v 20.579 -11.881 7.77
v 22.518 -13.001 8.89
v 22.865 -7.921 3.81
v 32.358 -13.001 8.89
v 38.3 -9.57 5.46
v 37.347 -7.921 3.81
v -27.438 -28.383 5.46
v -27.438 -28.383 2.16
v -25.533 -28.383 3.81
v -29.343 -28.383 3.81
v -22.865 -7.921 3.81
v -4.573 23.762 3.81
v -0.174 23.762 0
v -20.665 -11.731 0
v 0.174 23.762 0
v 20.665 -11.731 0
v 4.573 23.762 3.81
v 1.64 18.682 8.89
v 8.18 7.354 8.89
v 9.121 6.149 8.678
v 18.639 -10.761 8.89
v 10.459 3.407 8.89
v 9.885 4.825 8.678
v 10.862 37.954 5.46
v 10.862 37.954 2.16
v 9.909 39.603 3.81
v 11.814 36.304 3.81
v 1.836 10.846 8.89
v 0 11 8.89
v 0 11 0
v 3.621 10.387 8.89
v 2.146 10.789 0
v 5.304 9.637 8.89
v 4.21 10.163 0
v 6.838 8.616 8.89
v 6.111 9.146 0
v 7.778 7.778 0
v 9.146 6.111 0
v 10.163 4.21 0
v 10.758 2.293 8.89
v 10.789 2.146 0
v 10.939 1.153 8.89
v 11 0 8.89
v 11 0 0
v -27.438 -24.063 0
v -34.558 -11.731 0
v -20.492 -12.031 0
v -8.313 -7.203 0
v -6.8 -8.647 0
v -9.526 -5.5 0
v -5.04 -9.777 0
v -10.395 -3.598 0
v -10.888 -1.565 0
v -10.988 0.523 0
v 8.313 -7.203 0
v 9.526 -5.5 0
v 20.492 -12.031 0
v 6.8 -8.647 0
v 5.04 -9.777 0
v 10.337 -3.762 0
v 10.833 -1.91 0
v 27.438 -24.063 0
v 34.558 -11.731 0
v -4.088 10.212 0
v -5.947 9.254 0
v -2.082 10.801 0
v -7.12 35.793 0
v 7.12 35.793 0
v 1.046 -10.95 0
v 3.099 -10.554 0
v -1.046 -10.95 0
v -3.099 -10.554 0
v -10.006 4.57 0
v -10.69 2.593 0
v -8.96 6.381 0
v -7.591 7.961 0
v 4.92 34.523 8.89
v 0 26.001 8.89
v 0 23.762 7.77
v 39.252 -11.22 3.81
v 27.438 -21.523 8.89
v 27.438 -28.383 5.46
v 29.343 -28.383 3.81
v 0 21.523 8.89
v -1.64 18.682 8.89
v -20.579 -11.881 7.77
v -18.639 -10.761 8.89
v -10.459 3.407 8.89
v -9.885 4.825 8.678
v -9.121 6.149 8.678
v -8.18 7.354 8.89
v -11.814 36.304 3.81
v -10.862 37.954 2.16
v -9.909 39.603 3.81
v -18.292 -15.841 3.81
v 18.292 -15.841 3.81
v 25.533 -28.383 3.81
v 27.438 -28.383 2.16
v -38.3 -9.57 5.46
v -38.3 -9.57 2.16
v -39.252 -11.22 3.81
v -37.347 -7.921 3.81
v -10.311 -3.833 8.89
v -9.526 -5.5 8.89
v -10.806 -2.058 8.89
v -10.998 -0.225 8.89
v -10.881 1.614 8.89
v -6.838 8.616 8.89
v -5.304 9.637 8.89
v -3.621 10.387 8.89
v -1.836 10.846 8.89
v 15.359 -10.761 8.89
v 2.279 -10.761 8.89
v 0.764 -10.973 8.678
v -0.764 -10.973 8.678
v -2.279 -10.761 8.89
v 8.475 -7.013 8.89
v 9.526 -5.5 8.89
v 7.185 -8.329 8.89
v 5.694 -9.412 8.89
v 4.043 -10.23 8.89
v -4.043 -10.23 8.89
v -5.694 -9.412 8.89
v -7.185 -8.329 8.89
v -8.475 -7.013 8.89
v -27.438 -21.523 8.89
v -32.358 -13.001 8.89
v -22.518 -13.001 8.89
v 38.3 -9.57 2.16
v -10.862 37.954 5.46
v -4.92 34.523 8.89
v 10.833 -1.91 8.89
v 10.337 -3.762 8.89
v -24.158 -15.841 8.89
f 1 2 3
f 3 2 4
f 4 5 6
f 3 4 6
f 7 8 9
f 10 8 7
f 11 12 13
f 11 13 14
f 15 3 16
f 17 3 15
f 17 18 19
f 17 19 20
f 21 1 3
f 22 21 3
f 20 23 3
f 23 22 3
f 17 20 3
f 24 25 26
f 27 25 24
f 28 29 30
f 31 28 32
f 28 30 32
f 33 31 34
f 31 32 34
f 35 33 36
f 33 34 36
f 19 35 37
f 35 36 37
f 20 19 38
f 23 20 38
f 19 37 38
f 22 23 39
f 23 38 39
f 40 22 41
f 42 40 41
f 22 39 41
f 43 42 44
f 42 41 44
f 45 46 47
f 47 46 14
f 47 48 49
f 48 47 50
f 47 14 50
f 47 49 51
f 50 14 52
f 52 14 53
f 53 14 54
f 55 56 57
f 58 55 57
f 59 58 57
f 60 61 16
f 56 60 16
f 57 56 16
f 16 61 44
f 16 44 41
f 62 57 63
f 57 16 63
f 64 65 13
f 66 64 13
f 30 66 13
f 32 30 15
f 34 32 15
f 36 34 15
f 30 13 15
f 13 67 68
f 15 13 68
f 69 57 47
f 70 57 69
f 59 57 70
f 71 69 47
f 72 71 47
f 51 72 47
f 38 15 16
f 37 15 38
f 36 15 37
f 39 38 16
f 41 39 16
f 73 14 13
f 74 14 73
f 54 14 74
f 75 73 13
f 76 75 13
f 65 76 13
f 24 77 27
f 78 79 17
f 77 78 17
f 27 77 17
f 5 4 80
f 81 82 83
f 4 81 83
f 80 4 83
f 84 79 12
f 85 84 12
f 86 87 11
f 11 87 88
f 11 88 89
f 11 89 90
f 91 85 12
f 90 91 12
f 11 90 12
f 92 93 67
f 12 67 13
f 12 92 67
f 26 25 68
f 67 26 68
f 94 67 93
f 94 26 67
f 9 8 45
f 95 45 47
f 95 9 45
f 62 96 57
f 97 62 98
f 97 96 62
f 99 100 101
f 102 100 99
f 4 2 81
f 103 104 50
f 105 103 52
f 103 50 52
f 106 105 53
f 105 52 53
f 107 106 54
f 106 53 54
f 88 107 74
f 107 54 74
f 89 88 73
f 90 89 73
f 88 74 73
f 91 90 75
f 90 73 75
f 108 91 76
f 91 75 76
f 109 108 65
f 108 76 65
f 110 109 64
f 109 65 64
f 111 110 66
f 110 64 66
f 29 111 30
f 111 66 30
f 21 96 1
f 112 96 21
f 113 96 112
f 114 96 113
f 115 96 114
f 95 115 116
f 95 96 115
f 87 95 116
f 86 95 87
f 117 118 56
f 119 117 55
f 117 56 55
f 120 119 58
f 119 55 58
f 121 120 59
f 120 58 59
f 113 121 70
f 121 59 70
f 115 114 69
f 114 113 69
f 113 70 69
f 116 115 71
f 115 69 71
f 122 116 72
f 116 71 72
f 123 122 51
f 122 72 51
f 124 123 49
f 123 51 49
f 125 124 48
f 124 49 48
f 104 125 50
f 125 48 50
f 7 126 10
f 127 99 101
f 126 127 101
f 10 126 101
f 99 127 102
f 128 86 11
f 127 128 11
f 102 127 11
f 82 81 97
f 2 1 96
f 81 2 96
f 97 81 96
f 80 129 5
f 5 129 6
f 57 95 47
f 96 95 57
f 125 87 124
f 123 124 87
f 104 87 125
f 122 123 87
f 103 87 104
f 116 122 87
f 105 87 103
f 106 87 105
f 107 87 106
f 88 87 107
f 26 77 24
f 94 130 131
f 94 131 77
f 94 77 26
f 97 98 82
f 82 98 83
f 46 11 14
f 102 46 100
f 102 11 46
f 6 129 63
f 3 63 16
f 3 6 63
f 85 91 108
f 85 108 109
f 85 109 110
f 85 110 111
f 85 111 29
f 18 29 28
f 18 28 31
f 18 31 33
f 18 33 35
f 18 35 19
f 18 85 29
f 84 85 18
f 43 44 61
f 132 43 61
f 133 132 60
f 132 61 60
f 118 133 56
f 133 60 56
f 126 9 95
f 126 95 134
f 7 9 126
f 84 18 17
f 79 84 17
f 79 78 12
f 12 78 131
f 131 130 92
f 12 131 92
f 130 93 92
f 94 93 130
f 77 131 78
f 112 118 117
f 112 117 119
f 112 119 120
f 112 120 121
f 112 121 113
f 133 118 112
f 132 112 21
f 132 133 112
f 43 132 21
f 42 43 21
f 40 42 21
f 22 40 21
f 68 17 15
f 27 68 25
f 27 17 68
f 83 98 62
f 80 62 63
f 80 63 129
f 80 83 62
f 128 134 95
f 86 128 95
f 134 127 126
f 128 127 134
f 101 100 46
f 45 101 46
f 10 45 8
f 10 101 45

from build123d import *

# Parameters (mm, degrees)
F1_DEPTH      = 8.89
F2_DEPTH      = 8.89
F3_SIZE       = 3.81
F4_SIZE       = 3.81
F5_T1_DEPTH   = 45.9464028027
F5_T3_DEPTH   = 45.9464028027
F5_T5_DEPTH   = 45.9464028027
F5_T10_DEPTH  = 40.6103682544
F5_T15_DEPTH  = 40.6103682544
F5_T20_DEPTH  = 62.7124373511
F5_T26_DEPTH  = 62.7124373511
F5_T32_DEPTH  = 40.6103682544
F5_T37_DEPTH  = 40.6103682544
F5_T42_DEPTH  = 62.7124373511
F5_T48_DEPTH  = 40.6103682544
F5_T53_DEPTH  = 40.6103682544
F5_T58_DEPTH  = 29.9382991577
F5_T63_DEPTH  = 29.9382991577
F5_T68_DEPTH  = 29.9382991577
F5_T73_DEPTH  = 29.9382991577
F5_T78_DEPTH  = 29.9382991577
F5_T83_DEPTH  = 29.9382991577
F5_T88_DEPTH  = 29.9382991577
F5_T93_DEPTH  = 29.9382991577
F5_T98_DEPTH  = 29.9382991577
F5_T103_DEPTH = 29.9382991577
F5_T108_DEPTH = 29.9382991577
F5_T113_DEPTH = 29.9382991577


# Not quite as in the source:
# - a fillet or chamfer that OpenCascade refuses, or shapes differently, is made with other operations: its cross-section is extruded or revolved along the edge and cut away or added


with BuildPart() as f1:
    # F0 (on Top) → F1 (new body)
    with BuildSketch(Plane.XY):
        with BuildLine():
            ThreePointArc((0, 11), (7.7781745931, 7.7781745931), (11, 0))
            ThreePointArc((11, 0), (10.6251840892, -2.8470094961), (9.5262794416, -5.5))
            Line((9.5262794416, -5.5), (13.7190518225, -7.9206982628))
            Line((13.7190518225, -7.9206982628), (22.8650863708, -7.9206982628))
            Line((22.8650863708, -7.9206982628), (4.5730172742, 23.7620947883))
            Line((4.5730172742, 23.7620947883), (0, 15.8413965255))
            Line((0, 15.8413965255), (0, 11))
        make_face()
        with BuildLine():
            Line((13.7190518225, -7.9206982628), (9.5262794416, -5.5))
            ThreePointArc((9.5262794416, -5.5), (0, -11), (-9.5262794416, -5.5))
            Line((-9.5262794416, -5.5), (-13.7190518225, -7.9206982628))
            Line((-13.7190518225, -7.9206982628), (-18.2920690967, -15.8413965255))
            Line((-18.2920690967, -15.8413965255), (18.2920690967, -15.8413965255))
            Line((18.2920690967, -15.8413965255), (13.7190518225, -7.9206982628))
        make_face()
        with BuildLine():
            ThreePointArc((-9.5262794416, -5.5), (-9.5262794416, 5.5), (0, 11))
            Line((0, 11), (0, 15.8413965255))
            Line((0, 15.8413965255), (-4.5730172742, 23.7620947883))
            Line((-4.5730172742, 23.7620947883), (-22.8650863708, -7.9206982628))
            Line((-22.8650863708, -7.9206982628), (-13.7190518225, -7.9206982628))
            Line((-13.7190518225, -7.9206982628), (-9.5262794416, -5.5))
        make_face()
    extrude(amount=F1_DEPTH)

    # F0 (on Top) → F2 (join)
    with BuildSketch(Plane.XY):
        with BuildLine():
            ThreePointArc((0, 11), (7.7781745931, 7.7781745931), (11, 0))
            ThreePointArc((11, 0), (10.6251840892, -2.8470094961), (9.5262794416, -5.5))
            Line((9.5262794416, -5.5), (13.7190518225, -7.9206982628))
            Line((13.7190518225, -7.9206982628), (22.8650863708, -7.9206982628))
            Line((22.8650863708, -7.9206982628), (4.5730172742, 23.7620947883))
            Line((4.5730172742, 23.7620947883), (0, 15.8413965255))
            Line((0, 15.8413965255), (0, 11))
        make_face()
        with BuildLine():
            ThreePointArc((-9.5262794416, -5.5), (-9.5262794416, 5.5), (0, 11))
            Line((0, 11), (0, 15.8413965255))
            Line((0, 15.8413965255), (-4.5730172742, 23.7620947883))
            Line((-4.5730172742, 23.7620947883), (-22.8650863708, -7.9206982628))
            Line((-22.8650863708, -7.9206982628), (-13.7190518225, -7.9206982628))
            Line((-13.7190518225, -7.9206982628), (-9.5262794416, -5.5))
        make_face()
        with BuildLine():
            Line((13.7190518225, -7.9206982628), (9.5262794416, -5.5))
            ThreePointArc((9.5262794416, -5.5), (0, -11), (-9.5262794416, -5.5))
            Line((-9.5262794416, -5.5), (-13.7190518225, -7.9206982628))
            Line((-13.7190518225, -7.9206982628), (-18.2920690967, -15.8413965255))
            Line((-18.2920690967, -15.8413965255), (18.2920690967, -15.8413965255))
            Line((18.2920690967, -15.8413965255), (13.7190518225, -7.9206982628))
        make_face()
        Polygon((-4.5730172742, 23.7620947883), (0, 15.8413965255), (0, 31.682793051), align=None)
        Polygon((0, 31.682793051), (0, 15.8413965255), (4.5730172742, 23.7620947883), align=None)
        Polygon((22.8650863708, -7.9206982628), (13.7190518225, -7.9206982628), (27.438103645, -15.8413965255), align=None)
        Polygon((27.438103645, -15.8413965255), (13.7190518225, -7.9206982628), (18.2920690967, -15.8413965255), align=None)
        Polygon((-18.2920690967, -15.8413965255), (-13.7190518225, -7.9206982628), (-27.438103645, -15.8413965255), align=None)
        Polygon((-27.438103645, -15.8413965255), (-13.7190518225, -7.9206982628), (-22.8650863708, -7.9206982628), align=None)
        Polygon((-4.5730172742, 23.7620947883), (0, 31.682793051), (4.5730172742, 23.7620947883), (13.7190518225, 39.6034913138), (-13.7190518225, 39.6034913138), align=None)
        Polygon((22.8650863708, -7.9206982628), (27.438103645, -15.8413965255), (18.2920690967, -15.8413965255), (27.438103645, -31.682793051), (41.1571554675, -7.9206982628), align=None)
        Polygon((-18.2920690967, -15.8413965255), (-27.438103645, -15.8413965255), (-22.8650863708, -7.9206982628), (-41.1571554675, -7.9206982628), (-27.438103645, -31.682793051), align=None)
    extrude(amount=F2_DEPTH)

    # F3
    f3_edges = [f1.edges().sort_by_distance(p)[0] for p in [
        (-22.865086, -23.762095, 0),
        (-34.29763, -19.801746, 0),
        (-32.011121, -7.920698, 0),
        (0, -15.841397, 0),
        (-13.719052, 7.920698, 0),
        (-9.146035, 31.682793, 0),
        (9.146035, 31.682793, 0),
        (13.719052, 7.920698, 0),
        (32.011121, -7.920698, 0),
        (34.29763, -19.801746, 0),
        (22.865086, -23.762095, 0),
        (0, 39.603491, 0),
    ]]
    chamfer(f3_edges, length=F3_SIZE)

    # F4
    f4_edges = [f1.edges().sort_by_distance(p)[0] for p in [
        (27.438104, -31.682793, 6.35),
        (41.157155, -7.920698, 6.35),
        (13.719052, 39.603491, 6.35),
        (-27.438104, -31.682793, 6.35),
        (-13.719052, 39.603491, 6.35),
        (-41.157155, -7.920698, 6.35),
    ]]
    chamfer(f4_edges, length=F4_SIZE)

    # F5: chamfer of 5.08 on 18 edges, made by hand

    # F5_s2 → F5_t1 (cut)
    with BuildSketch(Plane.YZ.offset(-22.9732014014)):
        Polygon((34.5234913138, 8.89), (39.6034913138, 3.81), (39.6034913138, 8.89), align=None)
    extrude(amount=F5_T1_DEPTH, mode=Mode.SUBTRACT)

    # F5_s4 → F5_t3 (cut)
    with BuildSketch(Plane(origin=(-11.4866007007, -19.8953760198, 0), x_dir=(0, 0, 1), z_dir=(0.5, 0.8660254038, 0))):
        Polygon((8.89, 34.5234913138), (3.81, 39.6034913138), (8.89, 39.6034913138), align=None)
    extrude(amount=F5_T3_DEPTH, mode=Mode.SUBTRACT)

    # F5_s6 → F5_t5 (cut)
    with BuildSketch(Plane(origin=(-11.4866007007, 19.8953760198, 0), x_dir=(0, 0, 1), z_dir=(0.5, -0.8660254038, 0))):
        Polygon((8.89, 34.5234913138), (3.81, 39.6034913138), (8.89, 39.6034913138), align=None)
    extrude(amount=F5_T5_DEPTH, mode=Mode.SUBTRACT)


with BuildPart() as f5_tool8:
    # F5_s9 → F5_t10 (new body)
    with BuildSketch(Plane(origin=(4.900468396, 8.4878602427, 0), x_dir=(0, 0, 1), z_dir=(0.5, 0.8660254038, 0))):
        Polygon((8.89, -13.0006982628), (3.81, -7.9206982628), (8.89, -7.9206982628), align=None)
    extrude(amount=F5_T10_DEPTH)

    split(bisect_by=Plane(origin=(8.5093043055, 4.9128491314, 9.8256982628), x_dir=(-0.5, 0.8660254038, 0), z_dir=(0.6123724357, 0.3535533906, 0.7071067812)), keep=Keep.TOP)


with BuildPart() as f1_1:
    add(f1.part)

    # F5_t7: cut F5_tool8
    add(f5_tool8.part, mode=Mode.SUBTRACT)


with BuildPart() as f5_tool13:
    # F5_s14 → F5_t15 (new body)
    with BuildSketch(Plane(origin=(-25.2056525232, 43.6574708081, 0), x_dir=(0, 0, 1), z_dir=(0.5, -0.8660254038, 0))):
        Polygon((8.89, -13.0006982628), (3.81, -7.9206982628), (8.89, -7.9206982628), align=None)
    extrude(amount=F5_T15_DEPTH)

    split(bisect_by=Plane(origin=(-8.5093043055, 4.9128491314, 9.8256982628), x_dir=(-0.5, -0.8660254038, 0), z_dir=(-0.6123724357, 0.3535533906, 0.7071067812)), keep=Keep.TOP)


with BuildPart() as f1_2:
    add(f1_1.part)

    # F5_t12: cut F5_tool13
    add(f5_tool13.part, mode=Mode.SUBTRACT)


with BuildPart() as f5_tool18:
    # F5_s19 → F5_t20 (new body)
    with BuildSketch(Plane(origin=(15.6781093378, 27.1552819396, 0), x_dir=(0, 0, 1), z_dir=(-0.5, -0.8660254038, 0))):
        Polygon((8.89, 10.7613965255), (3.81, 15.8413965255), (8.89, 15.8413965255), align=None)
    extrude(amount=F5_T20_DEPTH)

    split(bisect_by=Plane(origin=(1.7799845614, 1.0276745657, -2.0553491314), x_dir=(0.5, -0.8660254038, 0), z_dir=(-0.6123724357, -0.3535533906, 0.7071067812)), keep=Keep.TOP)

    split(bisect_by=Plane(origin=(0, -2.0553491314, -2.0553491314), x_dir=(1, 0, 0), z_dir=(0, 0.7071067812, 0.7071067812)), keep=Keep.TOP)


with BuildPart() as f1_3:
    add(f1_2.part)

    # F5_t17: cut F5_tool18
    add(f5_tool18.part, mode=Mode.SUBTRACT)


with BuildPart() as f5_tool24:
    # F5_s25 → F5_t26 (new body)
    with BuildSketch(Plane(origin=(15.6781093378, -27.1552819396, 0), x_dir=(0, 0, 1), z_dir=(-0.5, 0.8660254038, 0))):
        Polygon((8.89, 10.7613965255), (3.81, 15.8413965255), (8.89, 15.8413965255), align=None)
    extrude(amount=F5_T26_DEPTH)

    split(bisect_by=Plane(origin=(0, -2.0553491314, -2.0553491314), x_dir=(1, 0, 0), z_dir=(0, 0.7071067812, 0.7071067812)), keep=Keep.TOP)

    split(bisect_by=Plane(origin=(-1.7799845614, 1.0276745657, -2.0553491314), x_dir=(0.5, 0.8660254038, 0), z_dir=(0.6123724357, -0.3535533906, 0.7071067812)), keep=Keep.TOP)


with BuildPart() as f1_4:
    add(f1_3.part)

    # F5_t23: cut F5_tool24
    add(f5_tool24.part, mode=Mode.SUBTRACT)


with BuildPart() as f5_tool30:
    # F5_s31 → F5_t32 (new body)
    with BuildSketch(Plane.YZ.offset(50.4113050464)):
        Polygon((-13.0006982628, 8.89), (-7.9206982628, 3.81), (-7.9206982628, 8.89), align=None)
    extrude(amount=-F5_T32_DEPTH)

    split(bisect_by=Plane(origin=(8.5093043055, 4.9128491314, 9.8256982628), x_dir=(-0.5, 0.8660254038, 0), z_dir=(0.6123724357, 0.3535533906, 0.7071067812)), keep=Keep.TOP)


with BuildPart() as f1_5:
    add(f1_4.part)

    # F5_t29: cut F5_tool30
    add(f5_tool30.part, mode=Mode.SUBTRACT)


with BuildPart() as f5_tool35:
    # F5_s36 → F5_t37 (new body)
    with BuildSketch(Plane(origin=(4.900468396, -8.4878602427, 0), x_dir=(0, 0, 1), z_dir=(0.5, -0.8660254038, 0))):
        Polygon((8.89, -13.0006982628), (3.81, -7.9206982628), (8.89, -7.9206982628), align=None)
    extrude(amount=F5_T37_DEPTH)

    split(bisect_by=Plane(origin=(0, -9.8256982628, 9.8256982628), x_dir=(1, 0, 0), z_dir=(0, -0.7071067812, 0.7071067812)), keep=Keep.TOP)


with BuildPart() as f1_6:
    add(f1_5.part)

    # F5_t34: cut F5_tool35
    add(f5_tool35.part, mode=Mode.SUBTRACT)


with BuildPart() as f5_tool40:
    # F5_s41 → F5_t42 (new body)
    with BuildSketch(Plane.YZ.offset(-31.3562186755)):
        Polygon((-15.8413965255, 3.81), (-10.7613965255, 8.89), (-15.8413965255, 8.89), align=None)
    extrude(amount=F5_T42_DEPTH)

    split(bisect_by=Plane(origin=(-1.7799845614, 1.0276745657, -2.0553491314), x_dir=(0.5, 0.8660254038, 0), z_dir=(0.6123724357, -0.3535533906, 0.7071067812)), keep=Keep.TOP)

    split(bisect_by=Plane(origin=(1.7799845614, 1.0276745657, -2.0553491314), x_dir=(0.5, -0.8660254038, 0), z_dir=(-0.6123724357, -0.3535533906, 0.7071067812)), keep=Keep.TOP)


with BuildPart() as f1_7:
    add(f1_6.part)

    # F5_t39: cut F5_tool40
    add(f5_tool40.part, mode=Mode.SUBTRACT)


with BuildPart() as f5_tool46:
    # F5_s47 → F5_t48 (new body)
    with BuildSketch(Plane(origin=(-25.2056525232, -43.6574708081, 0), x_dir=(0, 0, 1), z_dir=(0.5, 0.8660254038, 0))):
        Polygon((3.81, -7.9206982628), (8.89, -13.0006982628), (8.89, -7.9206982628), align=None)
    extrude(amount=F5_T48_DEPTH)

    split(bisect_by=Plane(origin=(0, -9.8256982628, 9.8256982628), x_dir=(1, 0, 0), z_dir=(0, -0.7071067812, 0.7071067812)), keep=Keep.TOP)


with BuildPart() as f1_8:
    add(f1_7.part)

    # F5_t45: cut F5_tool46
    add(f5_tool46.part, mode=Mode.SUBTRACT)


with BuildPart() as f5_tool51:
    # F5_s52 → F5_t53 (new body)
    with BuildSketch(Plane.YZ.offset(-9.800936792)):
        Polygon((-13.0006982628, 8.89), (-7.9206982628, 3.81), (-7.9206982628, 8.89), align=None)
    extrude(amount=-F5_T53_DEPTH)

    split(bisect_by=Plane(origin=(-8.5093043055, 4.9128491314, 9.8256982628), x_dir=(-0.5, -0.8660254038, 0), z_dir=(-0.6123724357, 0.3535533906, 0.7071067812)), keep=Keep.TOP)


with BuildPart() as f1_9:
    add(f1_8.part)

    # F5_t50: cut F5_tool51
    add(f5_tool51.part, mode=Mode.SUBTRACT)


with BuildPart() as f5_tool56:
    # F5_s57 → F5_t58 (new body)
    with BuildSketch(Plane(origin=(-21.2036266119, -36.7257585966, 0), x_dir=(0, 0, 1), z_dir=(0.5, 0.8660254038, 0))):
        Polygon((8.89, -23.3032362626), (3.81, -28.3832362626), (8.89, -28.3832362626), align=None)
    extrude(amount=F5_T58_DEPTH)

    split(bisect_by=Plane(origin=(-18.7985931723, -10.8533728284, 21.7067456569), x_dir=(0.5, -0.8660254038, 0), z_dir=(-0.6123724357, -0.3535533906, 0.7071067812)), keep=Keep.TOP)


with BuildPart() as f1_10:
    add(f1_9.part)

    # F5_t55: cut F5_tool56
    add(f5_tool56.part, mode=Mode.SUBTRACT)


with BuildPart() as f5_tool61:
    # F5_s62 → F5_t63 (new body)
    with BuildSketch(Plane(origin=(-21.2036266119, -36.7257585966, 0), x_dir=(0, 0, 1), z_dir=(0.5, 0.8660254038, 0))):
        Polygon((8.89, -23.3032362626), (3.81, -28.3832362626), (8.89, -28.3832362626), align=None)
    extrude(amount=F5_T63_DEPTH)

    split(bisect_by=Plane(origin=(0, -2.0553491314, -2.0553491314), x_dir=(1, 0, 0), z_dir=(0, 0.7071067812, 0.7071067812)), keep=Keep.TOP)


with BuildPart() as f1_11:
    add(f1_10.part)

    # F5_t60: cut F5_tool61
    add(f5_tool61.part, mode=Mode.SUBTRACT)


with BuildPart() as f5_tool66:
    # F5_s67 → F5_t68 (new body)
    with BuildSketch(Plane.YZ.offset(-12.4689540661)):
        Polygon((-28.3832362626, 3.81), (-23.3032362626, 8.89), (-28.3832362626, 8.89), align=None)
    extrude(amount=-F5_T68_DEPTH)

    split(bisect_by=Plane(origin=(-1.7799845614, 1.0276745657, -2.0553491314), x_dir=(0.5, 0.8660254038, 0), z_dir=(0.6123724357, -0.3535533906, 0.7071067812)), keep=Keep.TOP)


with BuildPart() as f1_12:
    add(f1_11.part)

    # F5_t65: cut F5_tool66
    add(f5_tool66.part, mode=Mode.SUBTRACT)


with BuildPart() as f5_tool71:
    # F5_s72 → F5_t73 (new body)
    with BuildSketch(Plane.YZ.offset(-12.4689540661)):
        Polygon((-28.3832362626, 3.81), (-23.3032362626, 8.89), (-28.3832362626, 8.89), align=None)
    extrude(amount=-F5_T73_DEPTH)

    split(bisect_by=Plane(origin=(-18.7985931723, -10.8533728284, 21.7067456569), x_dir=(0.5, -0.8660254038, 0), z_dir=(-0.6123724357, -0.3535533906, 0.7071067812)), keep=Keep.TOP)


with BuildPart() as f1_13:
    add(f1_12.part)

    # F5_t70: cut F5_tool71
    add(f5_tool71.part, mode=Mode.SUBTRACT)


with BuildPart() as f5_tool76:
    # F5_s77 → F5_t78 (new body)
    with BuildSketch(Plane.YZ.offset(12.4689540661)):
        Polygon((-23.3032362626, 8.89), (-28.3832362626, 3.81), (-28.3832362626, 8.89), align=None)
    extrude(amount=F5_T78_DEPTH)

    split(bisect_by=Plane(origin=(1.7799845614, 1.0276745657, -2.0553491314), x_dir=(0.5, -0.8660254038, 0), z_dir=(-0.6123724357, -0.3535533906, 0.7071067812)), keep=Keep.TOP)


with BuildPart() as f1_14:
    add(f1_13.part)

    # F5_t75: cut F5_tool76
    add(f5_tool76.part, mode=Mode.SUBTRACT)


with BuildPart() as f5_tool81:
    # F5_s82 → F5_t83 (new body)
    with BuildSketch(Plane.YZ.offset(12.4689540661)):
        Polygon((-23.3032362626, 8.89), (-28.3832362626, 3.81), (-28.3832362626, 8.89), align=None)
    extrude(amount=F5_T83_DEPTH)

    split(bisect_by=Plane(origin=(18.7985931723, -10.8533728284, 21.7067456569), x_dir=(0.5, 0.8660254038, 0), z_dir=(0.6123724357, -0.3535533906, 0.7071067812)), keep=Keep.TOP)


with BuildPart() as f1_15:
    add(f1_14.part)

    # F5_t80: cut F5_tool81
    add(f5_tool81.part, mode=Mode.SUBTRACT)


with BuildPart() as f5_tool86:
    # F5_s87 → F5_t88 (new body)
    with BuildSketch(Plane(origin=(21.2036266119, -36.7257585966, 0), x_dir=(0, 0, 1), z_dir=(-0.5, 0.8660254038, 0))):
        Polygon((8.89, 23.3032362626), (3.81, 28.3832362626), (8.89, 28.3832362626), align=None)
    extrude(amount=F5_T88_DEPTH)

    split(bisect_by=Plane(origin=(18.7985931723, -10.8533728284, 21.7067456569), x_dir=(0.5, 0.8660254038, 0), z_dir=(0.6123724357, -0.3535533906, 0.7071067812)), keep=Keep.TOP)


with BuildPart() as f1_16:
    add(f1_15.part)

    # F5_t85: cut F5_tool86
    add(f5_tool86.part, mode=Mode.SUBTRACT)


with BuildPart() as f5_tool91:
    # F5_s92 → F5_t93 (new body)
    with BuildSketch(Plane(origin=(21.2036266119, -36.7257585966, 0), x_dir=(0, 0, 1), z_dir=(-0.5, 0.8660254038, 0))):
        Polygon((8.89, 23.3032362626), (3.81, 28.3832362626), (8.89, 28.3832362626), align=None)
    extrude(amount=F5_T93_DEPTH)

    split(bisect_by=Plane(origin=(0, -2.0553491314, -2.0553491314), x_dir=(1, 0, 0), z_dir=(0, 0.7071067812, 0.7071067812)), keep=Keep.TOP)


with BuildPart() as f1_17:
    add(f1_16.part)

    # F5_t90: cut F5_tool91
    add(f5_tool91.part, mode=Mode.SUBTRACT)


with BuildPart() as f5_tool96:
    # F5_s97 → F5_t98 (new body)
    with BuildSketch(Plane(origin=(-6.2344770331, 10.7984309799, 0), x_dir=(0, 0, 1), z_dir=(-0.5, 0.8660254038, 0))):
        Polygon((8.89, 23.3032362626), (3.81, 28.3832362626), (8.89, 28.3832362626), align=None)
    extrude(amount=F5_T98_DEPTH)

    split(bisect_by=Plane(origin=(-1.7799845614, 1.0276745657, -2.0553491314), x_dir=(0.5, 0.8660254038, 0), z_dir=(0.6123724357, -0.3535533906, 0.7071067812)), keep=Keep.TOP)


with BuildPart() as f1_18:
    add(f1_17.part)

    # F5_t95: cut F5_tool96
    add(f5_tool96.part, mode=Mode.SUBTRACT)


with BuildPart() as f5_tool101:
    # F5_s102 → F5_t103 (new body)
    with BuildSketch(Plane(origin=(-6.2344770331, 10.7984309799, 0), x_dir=(0, 0, 1), z_dir=(-0.5, 0.8660254038, 0))):
        Polygon((8.89, 23.3032362626), (3.81, 28.3832362626), (8.89, 28.3832362626), align=None)
    extrude(amount=F5_T103_DEPTH)

    split(bisect_by=Plane(origin=(0, 21.7067456569, 21.7067456569), x_dir=(1, 0, 0), z_dir=(0, 0.7071067812, 0.7071067812)), keep=Keep.TOP)


with BuildPart() as f1_19:
    add(f1_18.part)

    # F5_t100: cut F5_tool101
    add(f5_tool101.part, mode=Mode.SUBTRACT)


with BuildPart() as f5_tool106:
    # F5_s107 → F5_t108 (new body)
    with BuildSketch(Plane(origin=(21.2036266119, 36.7257585966, 0), x_dir=(0, 0, 1), z_dir=(-0.5, -0.8660254038, 0))):
        Polygon((8.89, 23.3032362626), (3.81, 28.3832362626), (8.89, 28.3832362626), align=None)
    extrude(amount=F5_T108_DEPTH)

    split(bisect_by=Plane(origin=(0, 21.7067456569, 21.7067456569), x_dir=(1, 0, 0), z_dir=(0, 0.7071067812, 0.7071067812)), keep=Keep.TOP)


with BuildPart() as f1_20:
    add(f1_19.part)

    # F5_t105: cut F5_tool106
    add(f5_tool106.part, mode=Mode.SUBTRACT)


with BuildPart() as f5_tool111:
    # F5_s112 → F5_t113 (new body)
    with BuildSketch(Plane(origin=(21.2036266119, 36.7257585966, 0), x_dir=(0, 0, 1), z_dir=(-0.5, -0.8660254038, 0))):
        Polygon((8.89, 23.3032362626), (3.81, 28.3832362626), (8.89, 28.3832362626), align=None)
    extrude(amount=F5_T113_DEPTH)

    split(bisect_by=Plane(origin=(1.7799845614, 1.0276745657, -2.0553491314), x_dir=(0.5, -0.8660254038, 0), z_dir=(-0.6123724357, -0.3535533906, 0.7071067812)), keep=Keep.TOP)


with BuildPart() as f1_21:
    add(f1_20.part)

    # F5_t110: cut F5_tool111
    add(f5_tool111.part, mode=Mode.SUBTRACT)


solid = f1_21.part
